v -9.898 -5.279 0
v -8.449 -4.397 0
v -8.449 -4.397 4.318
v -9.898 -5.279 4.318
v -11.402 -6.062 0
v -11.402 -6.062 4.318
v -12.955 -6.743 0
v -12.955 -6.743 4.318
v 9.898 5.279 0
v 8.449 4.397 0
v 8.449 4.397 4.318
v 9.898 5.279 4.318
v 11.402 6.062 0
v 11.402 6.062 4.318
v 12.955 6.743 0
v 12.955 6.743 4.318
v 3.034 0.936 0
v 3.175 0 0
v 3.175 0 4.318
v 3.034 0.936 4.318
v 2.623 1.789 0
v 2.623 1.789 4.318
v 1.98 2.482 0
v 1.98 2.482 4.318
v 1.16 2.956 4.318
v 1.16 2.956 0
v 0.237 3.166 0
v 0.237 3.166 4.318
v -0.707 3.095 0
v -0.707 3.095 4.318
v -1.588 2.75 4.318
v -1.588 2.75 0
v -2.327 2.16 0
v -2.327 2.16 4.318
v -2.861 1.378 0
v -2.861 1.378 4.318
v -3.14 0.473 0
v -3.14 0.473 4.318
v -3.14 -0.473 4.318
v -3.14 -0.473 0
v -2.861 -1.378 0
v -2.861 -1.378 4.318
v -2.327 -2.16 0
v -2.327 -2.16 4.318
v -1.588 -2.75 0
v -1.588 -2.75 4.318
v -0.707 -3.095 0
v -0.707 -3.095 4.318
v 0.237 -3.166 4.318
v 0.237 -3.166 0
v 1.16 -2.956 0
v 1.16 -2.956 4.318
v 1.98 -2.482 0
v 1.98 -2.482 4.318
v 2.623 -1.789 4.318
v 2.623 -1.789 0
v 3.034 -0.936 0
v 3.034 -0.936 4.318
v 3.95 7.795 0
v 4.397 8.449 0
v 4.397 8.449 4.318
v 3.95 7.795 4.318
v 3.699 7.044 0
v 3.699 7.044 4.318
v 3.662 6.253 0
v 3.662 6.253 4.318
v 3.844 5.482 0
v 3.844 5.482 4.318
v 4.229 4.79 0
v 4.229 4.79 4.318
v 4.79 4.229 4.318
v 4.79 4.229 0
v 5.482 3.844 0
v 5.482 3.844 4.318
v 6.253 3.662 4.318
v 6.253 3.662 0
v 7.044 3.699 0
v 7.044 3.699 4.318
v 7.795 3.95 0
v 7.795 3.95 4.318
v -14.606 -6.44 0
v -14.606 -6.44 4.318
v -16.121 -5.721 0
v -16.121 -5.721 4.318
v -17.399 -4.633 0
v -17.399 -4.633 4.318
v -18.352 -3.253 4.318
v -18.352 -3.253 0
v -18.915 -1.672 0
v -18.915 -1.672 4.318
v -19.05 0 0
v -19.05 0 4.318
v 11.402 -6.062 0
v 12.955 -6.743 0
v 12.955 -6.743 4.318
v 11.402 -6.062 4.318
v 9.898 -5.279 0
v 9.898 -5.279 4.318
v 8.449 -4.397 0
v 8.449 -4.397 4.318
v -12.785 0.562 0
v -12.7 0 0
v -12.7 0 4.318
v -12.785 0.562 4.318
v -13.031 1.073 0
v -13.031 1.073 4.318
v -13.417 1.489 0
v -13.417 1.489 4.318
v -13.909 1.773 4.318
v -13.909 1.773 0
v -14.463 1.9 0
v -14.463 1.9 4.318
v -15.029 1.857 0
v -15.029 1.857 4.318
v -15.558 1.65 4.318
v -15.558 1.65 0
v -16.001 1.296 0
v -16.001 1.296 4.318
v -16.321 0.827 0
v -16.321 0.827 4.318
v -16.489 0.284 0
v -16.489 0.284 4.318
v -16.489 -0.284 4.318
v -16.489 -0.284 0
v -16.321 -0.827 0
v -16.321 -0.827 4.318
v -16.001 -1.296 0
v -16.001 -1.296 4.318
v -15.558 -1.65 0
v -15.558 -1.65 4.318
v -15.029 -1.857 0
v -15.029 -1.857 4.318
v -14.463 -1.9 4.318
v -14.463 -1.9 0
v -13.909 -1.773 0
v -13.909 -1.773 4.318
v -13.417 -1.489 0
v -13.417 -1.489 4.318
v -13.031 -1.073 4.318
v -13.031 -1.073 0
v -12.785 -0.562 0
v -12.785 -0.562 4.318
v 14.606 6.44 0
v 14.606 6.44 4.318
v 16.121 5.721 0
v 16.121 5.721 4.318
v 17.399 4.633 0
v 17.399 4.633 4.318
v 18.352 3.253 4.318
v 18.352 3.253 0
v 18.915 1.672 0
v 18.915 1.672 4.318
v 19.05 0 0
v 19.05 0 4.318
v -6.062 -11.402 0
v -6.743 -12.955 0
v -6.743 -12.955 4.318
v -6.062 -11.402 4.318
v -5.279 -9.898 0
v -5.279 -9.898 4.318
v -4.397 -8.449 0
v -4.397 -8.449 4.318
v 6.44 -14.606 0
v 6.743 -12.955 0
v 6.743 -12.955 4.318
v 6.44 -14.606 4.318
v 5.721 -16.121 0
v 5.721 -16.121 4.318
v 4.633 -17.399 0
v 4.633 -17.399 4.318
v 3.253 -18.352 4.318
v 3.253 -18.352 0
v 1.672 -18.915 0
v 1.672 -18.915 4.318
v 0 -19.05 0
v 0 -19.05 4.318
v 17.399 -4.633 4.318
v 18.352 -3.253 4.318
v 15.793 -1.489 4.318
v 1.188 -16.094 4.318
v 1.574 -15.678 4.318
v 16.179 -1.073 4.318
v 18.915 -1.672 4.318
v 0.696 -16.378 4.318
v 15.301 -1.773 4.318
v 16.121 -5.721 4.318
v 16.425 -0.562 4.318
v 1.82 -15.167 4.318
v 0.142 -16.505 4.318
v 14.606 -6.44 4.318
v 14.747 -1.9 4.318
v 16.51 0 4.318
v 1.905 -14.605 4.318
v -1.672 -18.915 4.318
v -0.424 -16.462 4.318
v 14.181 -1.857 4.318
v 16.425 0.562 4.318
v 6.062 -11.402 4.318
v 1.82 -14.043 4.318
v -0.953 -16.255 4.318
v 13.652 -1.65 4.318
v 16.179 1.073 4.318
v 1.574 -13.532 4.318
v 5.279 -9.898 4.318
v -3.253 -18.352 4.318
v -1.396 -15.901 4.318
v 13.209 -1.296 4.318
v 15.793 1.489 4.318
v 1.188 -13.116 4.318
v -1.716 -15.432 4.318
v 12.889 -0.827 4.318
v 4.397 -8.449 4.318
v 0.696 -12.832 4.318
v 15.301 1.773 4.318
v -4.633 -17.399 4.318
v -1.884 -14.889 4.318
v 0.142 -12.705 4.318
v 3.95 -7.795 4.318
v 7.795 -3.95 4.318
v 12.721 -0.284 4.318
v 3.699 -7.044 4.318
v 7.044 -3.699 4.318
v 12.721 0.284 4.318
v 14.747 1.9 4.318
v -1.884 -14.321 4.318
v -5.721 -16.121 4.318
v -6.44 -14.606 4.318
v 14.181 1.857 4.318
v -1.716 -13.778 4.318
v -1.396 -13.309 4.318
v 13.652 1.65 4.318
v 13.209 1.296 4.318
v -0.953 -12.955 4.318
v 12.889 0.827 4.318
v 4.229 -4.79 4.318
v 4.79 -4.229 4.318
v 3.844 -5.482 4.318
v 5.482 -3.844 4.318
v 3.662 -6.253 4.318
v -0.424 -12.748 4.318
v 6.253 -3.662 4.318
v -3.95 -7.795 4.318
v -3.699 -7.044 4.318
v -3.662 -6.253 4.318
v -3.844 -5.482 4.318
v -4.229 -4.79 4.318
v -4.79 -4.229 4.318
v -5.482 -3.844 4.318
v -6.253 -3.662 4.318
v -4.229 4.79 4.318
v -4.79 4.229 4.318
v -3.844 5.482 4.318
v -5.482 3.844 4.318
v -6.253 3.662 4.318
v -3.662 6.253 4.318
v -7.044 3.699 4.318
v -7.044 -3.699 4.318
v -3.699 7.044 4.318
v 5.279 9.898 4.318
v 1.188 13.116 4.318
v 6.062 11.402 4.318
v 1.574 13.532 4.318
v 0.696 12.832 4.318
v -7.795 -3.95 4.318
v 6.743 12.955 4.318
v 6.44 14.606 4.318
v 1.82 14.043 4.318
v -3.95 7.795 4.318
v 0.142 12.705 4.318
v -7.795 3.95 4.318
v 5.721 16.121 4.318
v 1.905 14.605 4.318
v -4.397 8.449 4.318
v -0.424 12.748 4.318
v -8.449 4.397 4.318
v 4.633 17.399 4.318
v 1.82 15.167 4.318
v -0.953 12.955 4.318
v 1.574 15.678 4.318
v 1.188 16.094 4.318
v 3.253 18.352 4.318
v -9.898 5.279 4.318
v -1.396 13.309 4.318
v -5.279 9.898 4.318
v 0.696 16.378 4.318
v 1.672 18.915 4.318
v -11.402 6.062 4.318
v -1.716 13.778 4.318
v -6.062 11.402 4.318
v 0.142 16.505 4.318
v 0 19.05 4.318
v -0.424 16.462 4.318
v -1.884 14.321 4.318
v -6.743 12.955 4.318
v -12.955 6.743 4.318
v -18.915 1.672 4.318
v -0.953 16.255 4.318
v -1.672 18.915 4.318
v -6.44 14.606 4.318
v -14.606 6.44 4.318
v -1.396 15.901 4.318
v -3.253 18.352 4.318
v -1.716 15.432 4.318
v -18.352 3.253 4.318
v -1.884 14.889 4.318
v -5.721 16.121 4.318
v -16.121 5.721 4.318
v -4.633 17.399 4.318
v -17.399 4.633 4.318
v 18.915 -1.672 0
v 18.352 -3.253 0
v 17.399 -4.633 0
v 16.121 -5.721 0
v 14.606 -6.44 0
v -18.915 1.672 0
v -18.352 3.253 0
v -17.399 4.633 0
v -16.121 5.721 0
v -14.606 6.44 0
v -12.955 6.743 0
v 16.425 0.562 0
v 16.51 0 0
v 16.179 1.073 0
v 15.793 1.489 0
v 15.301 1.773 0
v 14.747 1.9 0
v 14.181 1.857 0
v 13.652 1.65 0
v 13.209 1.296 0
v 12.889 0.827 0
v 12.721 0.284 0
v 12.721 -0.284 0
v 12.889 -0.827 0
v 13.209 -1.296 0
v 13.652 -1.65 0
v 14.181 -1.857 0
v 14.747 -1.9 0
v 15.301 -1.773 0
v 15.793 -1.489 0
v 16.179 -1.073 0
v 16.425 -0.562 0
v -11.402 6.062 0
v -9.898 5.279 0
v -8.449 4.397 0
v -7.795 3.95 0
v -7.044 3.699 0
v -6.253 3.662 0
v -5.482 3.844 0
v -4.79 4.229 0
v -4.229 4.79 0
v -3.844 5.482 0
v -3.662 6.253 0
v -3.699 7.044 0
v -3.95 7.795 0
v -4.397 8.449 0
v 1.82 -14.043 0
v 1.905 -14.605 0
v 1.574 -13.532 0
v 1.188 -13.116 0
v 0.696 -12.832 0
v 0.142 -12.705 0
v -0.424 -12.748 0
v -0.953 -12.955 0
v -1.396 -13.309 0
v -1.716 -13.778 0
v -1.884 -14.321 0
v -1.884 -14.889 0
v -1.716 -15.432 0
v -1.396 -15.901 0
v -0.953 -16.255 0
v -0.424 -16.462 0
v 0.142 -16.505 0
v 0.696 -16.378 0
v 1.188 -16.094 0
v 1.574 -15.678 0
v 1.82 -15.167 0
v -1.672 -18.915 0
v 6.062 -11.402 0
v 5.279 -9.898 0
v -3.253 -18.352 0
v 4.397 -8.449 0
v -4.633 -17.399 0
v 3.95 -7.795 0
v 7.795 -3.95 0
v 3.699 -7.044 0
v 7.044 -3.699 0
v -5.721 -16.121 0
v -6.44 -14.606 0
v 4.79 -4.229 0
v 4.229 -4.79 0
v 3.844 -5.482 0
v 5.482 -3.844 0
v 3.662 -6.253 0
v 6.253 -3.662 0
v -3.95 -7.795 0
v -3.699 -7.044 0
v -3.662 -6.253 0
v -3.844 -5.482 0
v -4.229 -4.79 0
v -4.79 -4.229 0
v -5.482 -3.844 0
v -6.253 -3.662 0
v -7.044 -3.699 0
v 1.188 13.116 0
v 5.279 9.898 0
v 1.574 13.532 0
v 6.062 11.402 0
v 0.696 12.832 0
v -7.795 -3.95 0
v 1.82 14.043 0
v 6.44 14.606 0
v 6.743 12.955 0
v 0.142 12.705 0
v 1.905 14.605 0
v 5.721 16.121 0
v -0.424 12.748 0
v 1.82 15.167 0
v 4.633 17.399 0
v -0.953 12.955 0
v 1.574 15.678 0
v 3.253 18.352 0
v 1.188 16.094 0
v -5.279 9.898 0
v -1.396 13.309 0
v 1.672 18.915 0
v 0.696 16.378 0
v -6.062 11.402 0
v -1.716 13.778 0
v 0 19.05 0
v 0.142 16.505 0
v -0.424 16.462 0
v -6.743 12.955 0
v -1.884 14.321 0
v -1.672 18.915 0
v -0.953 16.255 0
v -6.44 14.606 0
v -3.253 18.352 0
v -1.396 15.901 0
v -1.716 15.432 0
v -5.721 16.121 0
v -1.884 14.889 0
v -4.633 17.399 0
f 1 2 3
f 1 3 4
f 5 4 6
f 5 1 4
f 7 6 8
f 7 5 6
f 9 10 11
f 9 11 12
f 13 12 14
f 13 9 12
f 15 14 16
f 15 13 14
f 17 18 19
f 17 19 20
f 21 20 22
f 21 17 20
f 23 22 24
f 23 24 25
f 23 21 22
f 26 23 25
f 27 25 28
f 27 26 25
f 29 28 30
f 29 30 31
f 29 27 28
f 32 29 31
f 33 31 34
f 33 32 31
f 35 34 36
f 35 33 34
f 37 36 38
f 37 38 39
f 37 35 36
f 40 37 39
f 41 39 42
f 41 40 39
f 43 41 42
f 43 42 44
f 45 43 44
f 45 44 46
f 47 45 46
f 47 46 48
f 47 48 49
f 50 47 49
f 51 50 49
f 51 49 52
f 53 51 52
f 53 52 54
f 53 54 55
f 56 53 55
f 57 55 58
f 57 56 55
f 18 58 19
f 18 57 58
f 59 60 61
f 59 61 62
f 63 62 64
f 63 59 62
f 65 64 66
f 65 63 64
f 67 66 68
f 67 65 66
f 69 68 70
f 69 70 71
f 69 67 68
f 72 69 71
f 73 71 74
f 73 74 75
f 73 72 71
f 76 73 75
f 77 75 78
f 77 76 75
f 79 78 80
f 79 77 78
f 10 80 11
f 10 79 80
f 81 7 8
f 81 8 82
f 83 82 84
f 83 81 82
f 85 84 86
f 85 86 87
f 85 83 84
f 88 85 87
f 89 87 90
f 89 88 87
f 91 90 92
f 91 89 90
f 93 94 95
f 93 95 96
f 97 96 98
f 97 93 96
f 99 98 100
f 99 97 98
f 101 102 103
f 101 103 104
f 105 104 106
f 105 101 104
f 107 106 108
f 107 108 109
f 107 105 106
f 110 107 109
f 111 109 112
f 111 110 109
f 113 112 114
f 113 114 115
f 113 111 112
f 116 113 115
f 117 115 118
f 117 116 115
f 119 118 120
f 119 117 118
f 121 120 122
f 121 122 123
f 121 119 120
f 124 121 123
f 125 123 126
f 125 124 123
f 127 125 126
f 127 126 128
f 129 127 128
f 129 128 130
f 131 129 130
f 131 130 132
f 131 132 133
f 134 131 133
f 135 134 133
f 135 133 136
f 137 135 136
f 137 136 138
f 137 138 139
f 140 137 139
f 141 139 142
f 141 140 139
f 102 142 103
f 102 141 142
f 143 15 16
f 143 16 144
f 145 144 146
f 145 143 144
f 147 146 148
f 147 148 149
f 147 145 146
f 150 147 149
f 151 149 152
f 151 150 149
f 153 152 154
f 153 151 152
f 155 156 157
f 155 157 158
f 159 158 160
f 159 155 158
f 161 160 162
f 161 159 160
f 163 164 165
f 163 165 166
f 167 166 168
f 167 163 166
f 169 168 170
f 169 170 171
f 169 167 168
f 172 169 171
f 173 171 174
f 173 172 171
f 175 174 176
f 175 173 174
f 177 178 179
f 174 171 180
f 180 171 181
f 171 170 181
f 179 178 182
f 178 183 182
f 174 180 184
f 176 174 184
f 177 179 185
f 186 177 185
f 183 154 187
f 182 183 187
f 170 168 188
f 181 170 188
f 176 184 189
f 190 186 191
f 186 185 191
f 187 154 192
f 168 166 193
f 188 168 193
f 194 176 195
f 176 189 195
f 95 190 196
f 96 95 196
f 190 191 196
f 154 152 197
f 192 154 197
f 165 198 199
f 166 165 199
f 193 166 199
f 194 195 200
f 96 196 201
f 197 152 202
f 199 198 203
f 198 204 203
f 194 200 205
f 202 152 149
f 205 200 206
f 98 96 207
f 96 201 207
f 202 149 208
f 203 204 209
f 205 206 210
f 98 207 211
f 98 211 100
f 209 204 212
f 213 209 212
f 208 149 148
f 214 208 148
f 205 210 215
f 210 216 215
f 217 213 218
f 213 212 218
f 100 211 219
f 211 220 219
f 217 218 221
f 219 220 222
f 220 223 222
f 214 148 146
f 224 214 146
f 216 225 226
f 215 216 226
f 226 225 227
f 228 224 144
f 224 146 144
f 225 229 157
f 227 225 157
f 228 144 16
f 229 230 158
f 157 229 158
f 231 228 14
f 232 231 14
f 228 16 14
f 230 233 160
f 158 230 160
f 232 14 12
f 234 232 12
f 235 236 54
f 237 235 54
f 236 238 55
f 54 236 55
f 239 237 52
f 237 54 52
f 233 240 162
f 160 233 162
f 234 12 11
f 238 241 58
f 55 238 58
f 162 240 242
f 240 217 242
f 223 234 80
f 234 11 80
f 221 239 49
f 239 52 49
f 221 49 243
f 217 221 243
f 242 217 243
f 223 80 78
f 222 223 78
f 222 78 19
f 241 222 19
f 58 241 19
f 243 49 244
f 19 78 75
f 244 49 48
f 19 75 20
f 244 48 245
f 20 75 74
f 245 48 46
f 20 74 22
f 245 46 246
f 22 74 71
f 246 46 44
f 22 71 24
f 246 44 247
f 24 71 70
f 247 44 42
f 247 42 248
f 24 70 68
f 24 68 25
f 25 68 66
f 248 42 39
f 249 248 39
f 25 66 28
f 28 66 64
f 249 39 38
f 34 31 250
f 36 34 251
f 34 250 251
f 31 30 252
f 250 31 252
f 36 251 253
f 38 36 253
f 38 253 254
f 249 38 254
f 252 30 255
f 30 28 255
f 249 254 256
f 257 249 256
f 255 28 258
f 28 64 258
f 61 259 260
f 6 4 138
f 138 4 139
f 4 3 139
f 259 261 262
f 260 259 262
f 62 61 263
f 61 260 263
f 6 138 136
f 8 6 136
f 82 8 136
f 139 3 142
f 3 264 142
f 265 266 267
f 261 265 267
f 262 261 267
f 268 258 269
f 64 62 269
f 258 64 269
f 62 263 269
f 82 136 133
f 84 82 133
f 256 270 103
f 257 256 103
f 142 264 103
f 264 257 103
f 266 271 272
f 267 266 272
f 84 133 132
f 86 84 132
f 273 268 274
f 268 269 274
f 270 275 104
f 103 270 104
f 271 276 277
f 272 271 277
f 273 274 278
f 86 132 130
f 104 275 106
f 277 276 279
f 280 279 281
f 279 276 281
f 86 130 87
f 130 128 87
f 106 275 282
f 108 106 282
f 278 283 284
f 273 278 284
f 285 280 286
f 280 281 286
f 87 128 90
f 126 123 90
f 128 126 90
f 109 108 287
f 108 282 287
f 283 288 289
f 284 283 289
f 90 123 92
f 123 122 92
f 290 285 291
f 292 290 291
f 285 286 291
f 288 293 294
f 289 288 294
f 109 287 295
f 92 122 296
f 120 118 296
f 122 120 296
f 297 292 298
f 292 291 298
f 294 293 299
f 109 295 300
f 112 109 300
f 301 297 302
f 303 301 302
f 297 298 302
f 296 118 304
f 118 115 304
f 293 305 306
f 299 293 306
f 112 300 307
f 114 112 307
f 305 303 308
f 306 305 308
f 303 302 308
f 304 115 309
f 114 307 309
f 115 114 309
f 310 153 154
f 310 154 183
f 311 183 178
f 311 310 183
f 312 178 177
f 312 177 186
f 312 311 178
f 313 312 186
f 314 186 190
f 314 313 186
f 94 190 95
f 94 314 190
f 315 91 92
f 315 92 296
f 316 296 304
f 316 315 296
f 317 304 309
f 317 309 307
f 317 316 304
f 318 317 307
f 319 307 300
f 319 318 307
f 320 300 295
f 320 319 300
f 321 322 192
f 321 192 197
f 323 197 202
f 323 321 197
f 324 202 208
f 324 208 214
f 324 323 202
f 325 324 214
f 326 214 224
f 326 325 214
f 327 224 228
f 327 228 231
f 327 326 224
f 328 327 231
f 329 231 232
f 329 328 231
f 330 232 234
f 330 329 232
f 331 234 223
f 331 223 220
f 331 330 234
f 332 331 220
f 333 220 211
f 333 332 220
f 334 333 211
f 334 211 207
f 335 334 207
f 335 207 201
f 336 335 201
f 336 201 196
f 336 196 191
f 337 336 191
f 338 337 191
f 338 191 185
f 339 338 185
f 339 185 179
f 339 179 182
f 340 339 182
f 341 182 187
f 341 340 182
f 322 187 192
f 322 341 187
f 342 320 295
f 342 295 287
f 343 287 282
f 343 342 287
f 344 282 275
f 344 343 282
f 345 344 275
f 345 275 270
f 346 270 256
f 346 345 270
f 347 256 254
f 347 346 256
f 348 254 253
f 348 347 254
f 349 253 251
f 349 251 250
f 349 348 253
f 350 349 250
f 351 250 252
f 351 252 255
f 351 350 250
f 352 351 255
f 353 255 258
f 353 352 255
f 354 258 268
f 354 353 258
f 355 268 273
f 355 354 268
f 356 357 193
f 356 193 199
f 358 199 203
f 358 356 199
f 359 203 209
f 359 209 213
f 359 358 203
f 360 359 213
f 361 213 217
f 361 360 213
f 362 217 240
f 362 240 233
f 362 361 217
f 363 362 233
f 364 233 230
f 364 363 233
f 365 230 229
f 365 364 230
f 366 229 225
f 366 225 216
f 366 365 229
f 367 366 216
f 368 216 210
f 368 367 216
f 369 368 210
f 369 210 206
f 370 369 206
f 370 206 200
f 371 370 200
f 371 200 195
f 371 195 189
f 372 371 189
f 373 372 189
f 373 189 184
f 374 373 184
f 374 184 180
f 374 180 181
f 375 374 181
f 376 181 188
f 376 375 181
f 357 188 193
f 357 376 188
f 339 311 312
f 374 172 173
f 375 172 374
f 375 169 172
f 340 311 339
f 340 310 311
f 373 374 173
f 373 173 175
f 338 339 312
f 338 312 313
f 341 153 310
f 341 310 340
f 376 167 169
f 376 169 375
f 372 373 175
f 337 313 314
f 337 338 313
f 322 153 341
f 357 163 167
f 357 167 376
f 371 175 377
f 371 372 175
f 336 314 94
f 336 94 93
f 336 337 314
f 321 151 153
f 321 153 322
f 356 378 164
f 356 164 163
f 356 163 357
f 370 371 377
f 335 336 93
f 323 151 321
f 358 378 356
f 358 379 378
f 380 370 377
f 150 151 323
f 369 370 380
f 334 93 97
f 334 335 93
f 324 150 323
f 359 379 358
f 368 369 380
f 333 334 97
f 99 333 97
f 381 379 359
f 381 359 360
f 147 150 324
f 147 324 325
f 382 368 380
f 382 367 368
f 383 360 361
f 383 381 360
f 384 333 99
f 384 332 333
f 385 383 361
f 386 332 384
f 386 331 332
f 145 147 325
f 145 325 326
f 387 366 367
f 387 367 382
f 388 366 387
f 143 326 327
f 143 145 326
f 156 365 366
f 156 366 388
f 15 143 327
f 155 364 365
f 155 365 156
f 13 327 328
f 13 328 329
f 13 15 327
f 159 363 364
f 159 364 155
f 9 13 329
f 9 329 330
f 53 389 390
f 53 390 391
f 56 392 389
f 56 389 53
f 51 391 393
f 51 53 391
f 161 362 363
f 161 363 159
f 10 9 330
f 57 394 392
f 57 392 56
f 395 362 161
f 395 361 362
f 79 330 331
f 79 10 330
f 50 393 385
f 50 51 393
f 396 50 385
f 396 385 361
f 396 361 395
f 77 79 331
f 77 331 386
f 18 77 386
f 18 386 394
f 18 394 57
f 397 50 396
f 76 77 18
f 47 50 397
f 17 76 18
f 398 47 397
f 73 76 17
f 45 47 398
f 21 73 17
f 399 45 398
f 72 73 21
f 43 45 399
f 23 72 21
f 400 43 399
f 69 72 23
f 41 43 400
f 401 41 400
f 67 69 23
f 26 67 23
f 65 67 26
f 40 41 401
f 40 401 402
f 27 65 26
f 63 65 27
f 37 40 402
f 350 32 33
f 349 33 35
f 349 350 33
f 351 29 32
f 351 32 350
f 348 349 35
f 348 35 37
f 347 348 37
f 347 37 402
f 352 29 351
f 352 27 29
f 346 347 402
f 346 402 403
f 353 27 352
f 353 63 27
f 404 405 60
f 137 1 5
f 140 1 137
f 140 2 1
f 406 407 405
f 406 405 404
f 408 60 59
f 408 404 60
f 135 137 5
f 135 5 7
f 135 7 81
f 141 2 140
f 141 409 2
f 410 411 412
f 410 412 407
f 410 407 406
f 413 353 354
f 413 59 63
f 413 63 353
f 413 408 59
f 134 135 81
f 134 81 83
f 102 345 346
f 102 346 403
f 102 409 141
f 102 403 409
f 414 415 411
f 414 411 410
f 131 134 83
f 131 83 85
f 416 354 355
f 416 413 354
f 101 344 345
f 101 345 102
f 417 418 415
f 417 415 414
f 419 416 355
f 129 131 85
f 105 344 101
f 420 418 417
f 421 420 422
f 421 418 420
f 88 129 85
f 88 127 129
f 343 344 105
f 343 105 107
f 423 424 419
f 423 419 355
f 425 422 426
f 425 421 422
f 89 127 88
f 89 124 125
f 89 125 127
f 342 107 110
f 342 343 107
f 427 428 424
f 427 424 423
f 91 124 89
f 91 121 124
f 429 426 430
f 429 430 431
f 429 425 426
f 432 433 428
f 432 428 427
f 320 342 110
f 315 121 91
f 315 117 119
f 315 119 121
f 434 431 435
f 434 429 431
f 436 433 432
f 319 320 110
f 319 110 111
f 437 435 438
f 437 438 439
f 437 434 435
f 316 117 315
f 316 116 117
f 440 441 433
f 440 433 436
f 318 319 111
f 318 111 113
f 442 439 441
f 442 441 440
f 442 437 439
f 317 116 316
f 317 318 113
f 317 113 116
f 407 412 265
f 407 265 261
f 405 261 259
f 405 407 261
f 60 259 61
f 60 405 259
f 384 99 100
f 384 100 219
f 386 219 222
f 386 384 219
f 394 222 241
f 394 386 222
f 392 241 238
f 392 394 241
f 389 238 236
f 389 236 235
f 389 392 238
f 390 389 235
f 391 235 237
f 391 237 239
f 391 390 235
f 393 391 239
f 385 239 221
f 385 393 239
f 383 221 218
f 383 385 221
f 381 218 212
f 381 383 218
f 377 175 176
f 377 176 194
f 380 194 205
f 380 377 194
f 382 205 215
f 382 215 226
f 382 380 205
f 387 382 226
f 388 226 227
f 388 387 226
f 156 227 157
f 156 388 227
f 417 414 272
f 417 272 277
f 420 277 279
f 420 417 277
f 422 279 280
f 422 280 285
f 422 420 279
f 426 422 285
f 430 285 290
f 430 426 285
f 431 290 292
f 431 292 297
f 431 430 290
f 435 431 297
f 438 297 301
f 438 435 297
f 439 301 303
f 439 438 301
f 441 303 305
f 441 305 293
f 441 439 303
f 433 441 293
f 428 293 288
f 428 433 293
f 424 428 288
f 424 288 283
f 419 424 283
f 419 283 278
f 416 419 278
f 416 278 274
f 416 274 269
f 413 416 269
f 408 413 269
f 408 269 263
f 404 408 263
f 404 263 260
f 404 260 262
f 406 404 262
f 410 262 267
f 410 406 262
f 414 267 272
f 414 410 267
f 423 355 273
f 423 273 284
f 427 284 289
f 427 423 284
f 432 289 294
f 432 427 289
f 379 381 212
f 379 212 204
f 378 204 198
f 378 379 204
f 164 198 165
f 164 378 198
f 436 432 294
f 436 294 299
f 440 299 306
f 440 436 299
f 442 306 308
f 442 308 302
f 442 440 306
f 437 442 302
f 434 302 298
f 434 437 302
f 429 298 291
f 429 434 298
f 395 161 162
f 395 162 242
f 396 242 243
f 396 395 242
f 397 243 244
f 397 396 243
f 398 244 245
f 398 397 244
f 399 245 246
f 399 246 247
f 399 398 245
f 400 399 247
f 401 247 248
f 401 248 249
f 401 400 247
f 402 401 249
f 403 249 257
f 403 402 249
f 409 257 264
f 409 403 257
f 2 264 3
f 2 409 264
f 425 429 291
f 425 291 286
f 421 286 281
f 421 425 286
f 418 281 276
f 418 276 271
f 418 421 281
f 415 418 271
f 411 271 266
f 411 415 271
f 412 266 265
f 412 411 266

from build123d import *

# Parameters (mm, degrees)
SKETCH1_R           = 1.905
SKETCH1_R_2         = 3.175
BOSS_EXTRUDE1_DEPTH = 4.318


with BuildPart() as part:
    # Sketch1 → Boss-Extrude1 (new body)
    with BuildSketch(Plane.XY):
        with BuildLine():
            ThreePointArc((-6.74251391, 12.955482668), (-4.633472823, 17.399161687), (0, 19.05))
            ThreePointArc((0, 19.05), (4.633472823, 17.399161687), (6.74251391, 12.955482668))
            ThreePointArc((6.74251391, 12.955482668), (5.682842224, 10.643577378), (4.397291681, 8.449227827))
            ThreePointArc((4.397291681, 8.449227827), (4.490128061, 4.490128061), (8.449227827, 4.397291681))
            ThreePointArc((8.449227827, 4.397291681), (10.643577378, 5.682842224), (12.955482668, 6.74251391))
            ThreePointArc((12.955482668, 6.74251391), (17.399161687, 4.633472823), (19.05, 0))
            ThreePointArc((19.05, 0), (17.399161687, -4.633472823), (12.955482668, -6.74251391))
            ThreePointArc((12.955482668, -6.74251391), (10.643577378, -5.682842224), (8.449227827, -4.397291681))
            ThreePointArc((8.449227827, -4.397291681), (4.490128061, -4.490128061), (4.397291681, -8.449227827))
            ThreePointArc((4.397291681, -8.449227827), (5.682842224, -10.643577378), (6.74251391, -12.955482668))
            ThreePointArc((6.74251391, -12.955482668), (4.633472823, -17.399161687), (0, -19.05))
            ThreePointArc((0, -19.05), (-4.633472823, -17.399161687), (-6.74251391, -12.955482668))
            ThreePointArc((-6.74251391, -12.955482668), (-5.682842224, -10.643577378), (-4.397291681, -8.449227827))
            ThreePointArc((-4.397291681, -8.449227827), (-4.490128061, -4.490128061), (-8.449227827, -4.397291681))
            ThreePointArc((-8.449227827, -4.397291681), (-10.643577378, -5.682842224), (-12.955482668, -6.74251391))
            ThreePointArc((-12.955482668, -6.74251391), (-17.399161687, -4.633472823), (-19.05, 0))
            ThreePointArc((-19.05, 0), (-17.399161687, 4.633472823), (-12.955482668, 6.74251391))
            ThreePointArc((-12.955482668, 6.74251391), (-10.643577378, 5.682842224), (-8.449227827, 4.397291681))
            ThreePointArc((-8.449227827, 4.397291681), (-4.490128061, 4.490128061), (-4.397291681, 8.449227827))
            ThreePointArc((-4.397291681, 8.449227827), (-5.682842224, 10.643577378), (-6.74251391, 12.955482668))
        make_face()
        with Locations((0, 14.605)):
            Circle(SKETCH1_R, mode=Mode.SUBTRACT)
        with Locations((14.605, 0)):
            Circle(SKETCH1_R, mode=Mode.SUBTRACT)
        with Locations((0, -14.605)):
            Circle(SKETCH1_R, mode=Mode.SUBTRACT)
        with Locations((-14.605, 0)):
            Circle(SKETCH1_R, mode=Mode.SUBTRACT)
        Circle(SKETCH1_R_2, mode=Mode.SUBTRACT)
    extrude(amount=BOSS_EXTRUDE1_DEPTH)


solid = part.part
